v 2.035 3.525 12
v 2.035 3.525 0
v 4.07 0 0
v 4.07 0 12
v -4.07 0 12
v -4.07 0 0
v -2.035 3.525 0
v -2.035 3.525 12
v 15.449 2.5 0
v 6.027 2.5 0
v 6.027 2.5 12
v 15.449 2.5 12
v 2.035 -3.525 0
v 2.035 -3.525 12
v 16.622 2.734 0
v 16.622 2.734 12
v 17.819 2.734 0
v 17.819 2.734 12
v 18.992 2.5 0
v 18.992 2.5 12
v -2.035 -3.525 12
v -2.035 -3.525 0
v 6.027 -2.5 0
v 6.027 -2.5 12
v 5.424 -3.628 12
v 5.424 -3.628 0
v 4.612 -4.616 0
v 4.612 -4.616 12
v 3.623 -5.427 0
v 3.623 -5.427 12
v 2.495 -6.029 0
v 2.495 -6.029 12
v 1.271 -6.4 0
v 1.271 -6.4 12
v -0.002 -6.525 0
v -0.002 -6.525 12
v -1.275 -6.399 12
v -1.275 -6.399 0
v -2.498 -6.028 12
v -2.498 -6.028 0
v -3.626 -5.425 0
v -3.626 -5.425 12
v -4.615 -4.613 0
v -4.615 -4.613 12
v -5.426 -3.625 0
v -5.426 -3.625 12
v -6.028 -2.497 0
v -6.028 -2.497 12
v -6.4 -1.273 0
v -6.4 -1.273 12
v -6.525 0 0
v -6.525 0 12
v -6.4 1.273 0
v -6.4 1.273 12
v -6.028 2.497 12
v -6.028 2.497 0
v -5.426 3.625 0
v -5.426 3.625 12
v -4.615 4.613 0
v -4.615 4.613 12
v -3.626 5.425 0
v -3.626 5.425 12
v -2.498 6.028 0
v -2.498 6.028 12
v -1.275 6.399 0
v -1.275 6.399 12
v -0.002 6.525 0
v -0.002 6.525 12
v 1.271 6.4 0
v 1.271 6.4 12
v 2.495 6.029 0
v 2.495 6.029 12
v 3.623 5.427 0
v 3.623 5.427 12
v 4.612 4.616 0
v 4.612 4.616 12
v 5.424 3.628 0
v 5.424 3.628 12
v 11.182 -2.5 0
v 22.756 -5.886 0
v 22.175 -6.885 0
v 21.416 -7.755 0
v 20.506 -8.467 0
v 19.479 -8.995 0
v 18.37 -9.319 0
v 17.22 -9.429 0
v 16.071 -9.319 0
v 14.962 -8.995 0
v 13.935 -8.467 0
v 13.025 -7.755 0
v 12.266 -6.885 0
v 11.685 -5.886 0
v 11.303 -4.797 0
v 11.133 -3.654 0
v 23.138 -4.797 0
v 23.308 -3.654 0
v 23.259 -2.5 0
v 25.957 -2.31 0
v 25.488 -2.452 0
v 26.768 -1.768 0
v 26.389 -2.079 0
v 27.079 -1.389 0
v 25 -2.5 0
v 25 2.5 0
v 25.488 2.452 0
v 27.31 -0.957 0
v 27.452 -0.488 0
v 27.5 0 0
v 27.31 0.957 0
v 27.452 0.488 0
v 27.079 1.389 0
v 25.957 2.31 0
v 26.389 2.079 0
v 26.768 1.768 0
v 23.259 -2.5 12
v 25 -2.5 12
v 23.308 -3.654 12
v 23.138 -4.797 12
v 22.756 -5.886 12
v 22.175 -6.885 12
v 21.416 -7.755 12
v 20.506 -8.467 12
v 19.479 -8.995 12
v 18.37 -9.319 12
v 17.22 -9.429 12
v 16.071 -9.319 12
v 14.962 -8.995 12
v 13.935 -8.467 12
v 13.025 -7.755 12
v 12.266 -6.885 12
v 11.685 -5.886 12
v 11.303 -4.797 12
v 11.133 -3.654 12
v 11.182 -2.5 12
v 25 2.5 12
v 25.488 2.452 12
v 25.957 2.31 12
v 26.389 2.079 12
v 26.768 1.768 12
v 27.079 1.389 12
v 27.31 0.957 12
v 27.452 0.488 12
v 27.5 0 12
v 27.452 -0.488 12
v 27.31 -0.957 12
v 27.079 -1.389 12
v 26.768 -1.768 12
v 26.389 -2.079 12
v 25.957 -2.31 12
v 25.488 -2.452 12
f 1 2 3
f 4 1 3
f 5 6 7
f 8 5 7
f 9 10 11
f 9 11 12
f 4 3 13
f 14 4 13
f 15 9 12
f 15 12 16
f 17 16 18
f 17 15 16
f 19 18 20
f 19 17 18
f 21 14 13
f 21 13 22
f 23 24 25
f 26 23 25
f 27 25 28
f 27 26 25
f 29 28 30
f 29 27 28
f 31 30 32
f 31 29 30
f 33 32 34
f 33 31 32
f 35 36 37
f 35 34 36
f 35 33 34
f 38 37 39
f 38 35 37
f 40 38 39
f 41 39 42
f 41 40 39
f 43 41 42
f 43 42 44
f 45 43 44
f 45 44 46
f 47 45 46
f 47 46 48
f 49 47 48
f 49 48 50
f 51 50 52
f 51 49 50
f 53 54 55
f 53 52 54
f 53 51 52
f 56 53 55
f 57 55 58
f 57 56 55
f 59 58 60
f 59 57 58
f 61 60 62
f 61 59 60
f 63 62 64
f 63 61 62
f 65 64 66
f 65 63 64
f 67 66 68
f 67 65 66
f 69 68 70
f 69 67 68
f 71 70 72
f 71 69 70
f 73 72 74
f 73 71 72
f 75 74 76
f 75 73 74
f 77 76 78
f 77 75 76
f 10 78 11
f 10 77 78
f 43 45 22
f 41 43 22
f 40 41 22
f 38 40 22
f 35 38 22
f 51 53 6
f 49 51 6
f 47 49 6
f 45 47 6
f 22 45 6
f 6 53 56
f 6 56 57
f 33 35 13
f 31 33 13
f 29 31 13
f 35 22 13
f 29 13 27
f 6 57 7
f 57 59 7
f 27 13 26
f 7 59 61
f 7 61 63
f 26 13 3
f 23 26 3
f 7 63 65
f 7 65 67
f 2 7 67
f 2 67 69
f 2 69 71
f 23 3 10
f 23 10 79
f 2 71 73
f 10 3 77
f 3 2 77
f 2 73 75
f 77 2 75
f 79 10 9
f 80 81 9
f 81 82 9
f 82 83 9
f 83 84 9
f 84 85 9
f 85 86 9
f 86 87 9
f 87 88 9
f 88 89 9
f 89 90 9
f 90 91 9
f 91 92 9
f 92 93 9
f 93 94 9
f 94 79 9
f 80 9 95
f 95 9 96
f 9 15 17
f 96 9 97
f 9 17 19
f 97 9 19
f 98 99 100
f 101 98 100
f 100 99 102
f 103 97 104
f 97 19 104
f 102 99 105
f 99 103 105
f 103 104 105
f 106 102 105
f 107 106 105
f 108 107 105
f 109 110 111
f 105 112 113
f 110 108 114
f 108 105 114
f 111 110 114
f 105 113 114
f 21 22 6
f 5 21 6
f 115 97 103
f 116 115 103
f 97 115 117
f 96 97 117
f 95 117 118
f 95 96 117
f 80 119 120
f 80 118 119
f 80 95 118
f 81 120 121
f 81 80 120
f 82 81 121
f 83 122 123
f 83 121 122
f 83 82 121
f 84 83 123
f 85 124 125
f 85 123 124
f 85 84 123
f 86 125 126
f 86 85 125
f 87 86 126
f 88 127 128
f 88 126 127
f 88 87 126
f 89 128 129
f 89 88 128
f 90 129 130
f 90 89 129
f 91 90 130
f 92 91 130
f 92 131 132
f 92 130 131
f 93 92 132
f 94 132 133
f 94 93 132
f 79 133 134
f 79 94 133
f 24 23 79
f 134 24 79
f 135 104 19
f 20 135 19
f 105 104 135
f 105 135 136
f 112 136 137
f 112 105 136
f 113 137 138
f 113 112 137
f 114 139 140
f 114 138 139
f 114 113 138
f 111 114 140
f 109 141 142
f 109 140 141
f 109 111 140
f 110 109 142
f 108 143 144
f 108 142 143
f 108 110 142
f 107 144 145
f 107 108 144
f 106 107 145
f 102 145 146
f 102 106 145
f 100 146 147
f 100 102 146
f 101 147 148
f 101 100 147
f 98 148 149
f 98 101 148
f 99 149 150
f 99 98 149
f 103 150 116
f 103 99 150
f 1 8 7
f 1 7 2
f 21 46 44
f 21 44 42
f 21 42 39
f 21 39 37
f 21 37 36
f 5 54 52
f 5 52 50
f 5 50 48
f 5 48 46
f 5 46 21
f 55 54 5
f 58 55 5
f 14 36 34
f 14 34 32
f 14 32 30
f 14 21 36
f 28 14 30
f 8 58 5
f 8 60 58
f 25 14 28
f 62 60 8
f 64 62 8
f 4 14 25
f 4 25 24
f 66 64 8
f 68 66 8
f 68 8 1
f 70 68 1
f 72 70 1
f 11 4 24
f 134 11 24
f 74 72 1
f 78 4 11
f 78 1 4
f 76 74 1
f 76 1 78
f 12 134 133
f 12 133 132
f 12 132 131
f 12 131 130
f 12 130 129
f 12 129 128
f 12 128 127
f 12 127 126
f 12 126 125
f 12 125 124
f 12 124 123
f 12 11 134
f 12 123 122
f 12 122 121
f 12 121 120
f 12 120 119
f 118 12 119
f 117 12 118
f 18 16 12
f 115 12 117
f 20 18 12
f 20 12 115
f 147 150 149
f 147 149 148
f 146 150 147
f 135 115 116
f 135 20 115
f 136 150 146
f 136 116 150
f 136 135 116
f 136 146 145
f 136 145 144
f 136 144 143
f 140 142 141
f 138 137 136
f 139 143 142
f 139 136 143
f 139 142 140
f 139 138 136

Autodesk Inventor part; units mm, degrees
ref_plane "YZ Plane" through (0, 0, 0) normal (1, 0, 0) x (0, 1, 0)
ref_plane "XZ Plane" through (0, 0, 0) normal (0, 1, 0) x (-1, 0, 0)
ref_plane "XY Plane" through (0, 0, 0) normal (0, 0, 1) x (1, 0, 0)
sketch "Sketch1" plane through (0, 0, 0) normal (0, 0, 1) x (1, 0, 0)
  circle A0 centre (0, 0) radius 6.525
  line L0 (-2.0352, -3.525) -> (-4.0703, 0)
  line L1 (-4.0703, 0) -> (-2.0352, 3.525)
  line L2 (-2.0352, 3.525) -> (2.0352, 3.525)
  line L3 (2.0352, 3.525) -> (4.0703, 0)
  line L4 (4.0703, 0) -> (2.0352, -3.525)
  line L5 (2.0352, -3.525) -> (-2.0352, -3.525)
  line L6 (-4.0703, 0) -> (4.0703, 0) construction
  arc A1 (25, -2.5) -> (25, 2.5) centre (25, 0) ccw
  circle A2 centre (17.2205, -3.3329) radius 6.096
  line L7 (25, 2.5) -> (18.992, 2.5)
  line L8 (6.0271, 2.5) -> (15.449, 2.5)
  line L9 (6.0271, -2.5) -> (11.1817, -2.5)
  line L10 (23.2593, -2.5) -> (25, -2.5)
  dimension "d0" = 7.05
  dimension "d1" = 3
  dimension "d7" = 5
  dimension "d11" = 25
  dimension "d12" = 12.192
  dimension "d13" = 5.8329
  dimension "d14" = 7.7795
extrude "Extrusion2" add sketch "Sketch1" along normal blind 12
properties part number "wingnut"
